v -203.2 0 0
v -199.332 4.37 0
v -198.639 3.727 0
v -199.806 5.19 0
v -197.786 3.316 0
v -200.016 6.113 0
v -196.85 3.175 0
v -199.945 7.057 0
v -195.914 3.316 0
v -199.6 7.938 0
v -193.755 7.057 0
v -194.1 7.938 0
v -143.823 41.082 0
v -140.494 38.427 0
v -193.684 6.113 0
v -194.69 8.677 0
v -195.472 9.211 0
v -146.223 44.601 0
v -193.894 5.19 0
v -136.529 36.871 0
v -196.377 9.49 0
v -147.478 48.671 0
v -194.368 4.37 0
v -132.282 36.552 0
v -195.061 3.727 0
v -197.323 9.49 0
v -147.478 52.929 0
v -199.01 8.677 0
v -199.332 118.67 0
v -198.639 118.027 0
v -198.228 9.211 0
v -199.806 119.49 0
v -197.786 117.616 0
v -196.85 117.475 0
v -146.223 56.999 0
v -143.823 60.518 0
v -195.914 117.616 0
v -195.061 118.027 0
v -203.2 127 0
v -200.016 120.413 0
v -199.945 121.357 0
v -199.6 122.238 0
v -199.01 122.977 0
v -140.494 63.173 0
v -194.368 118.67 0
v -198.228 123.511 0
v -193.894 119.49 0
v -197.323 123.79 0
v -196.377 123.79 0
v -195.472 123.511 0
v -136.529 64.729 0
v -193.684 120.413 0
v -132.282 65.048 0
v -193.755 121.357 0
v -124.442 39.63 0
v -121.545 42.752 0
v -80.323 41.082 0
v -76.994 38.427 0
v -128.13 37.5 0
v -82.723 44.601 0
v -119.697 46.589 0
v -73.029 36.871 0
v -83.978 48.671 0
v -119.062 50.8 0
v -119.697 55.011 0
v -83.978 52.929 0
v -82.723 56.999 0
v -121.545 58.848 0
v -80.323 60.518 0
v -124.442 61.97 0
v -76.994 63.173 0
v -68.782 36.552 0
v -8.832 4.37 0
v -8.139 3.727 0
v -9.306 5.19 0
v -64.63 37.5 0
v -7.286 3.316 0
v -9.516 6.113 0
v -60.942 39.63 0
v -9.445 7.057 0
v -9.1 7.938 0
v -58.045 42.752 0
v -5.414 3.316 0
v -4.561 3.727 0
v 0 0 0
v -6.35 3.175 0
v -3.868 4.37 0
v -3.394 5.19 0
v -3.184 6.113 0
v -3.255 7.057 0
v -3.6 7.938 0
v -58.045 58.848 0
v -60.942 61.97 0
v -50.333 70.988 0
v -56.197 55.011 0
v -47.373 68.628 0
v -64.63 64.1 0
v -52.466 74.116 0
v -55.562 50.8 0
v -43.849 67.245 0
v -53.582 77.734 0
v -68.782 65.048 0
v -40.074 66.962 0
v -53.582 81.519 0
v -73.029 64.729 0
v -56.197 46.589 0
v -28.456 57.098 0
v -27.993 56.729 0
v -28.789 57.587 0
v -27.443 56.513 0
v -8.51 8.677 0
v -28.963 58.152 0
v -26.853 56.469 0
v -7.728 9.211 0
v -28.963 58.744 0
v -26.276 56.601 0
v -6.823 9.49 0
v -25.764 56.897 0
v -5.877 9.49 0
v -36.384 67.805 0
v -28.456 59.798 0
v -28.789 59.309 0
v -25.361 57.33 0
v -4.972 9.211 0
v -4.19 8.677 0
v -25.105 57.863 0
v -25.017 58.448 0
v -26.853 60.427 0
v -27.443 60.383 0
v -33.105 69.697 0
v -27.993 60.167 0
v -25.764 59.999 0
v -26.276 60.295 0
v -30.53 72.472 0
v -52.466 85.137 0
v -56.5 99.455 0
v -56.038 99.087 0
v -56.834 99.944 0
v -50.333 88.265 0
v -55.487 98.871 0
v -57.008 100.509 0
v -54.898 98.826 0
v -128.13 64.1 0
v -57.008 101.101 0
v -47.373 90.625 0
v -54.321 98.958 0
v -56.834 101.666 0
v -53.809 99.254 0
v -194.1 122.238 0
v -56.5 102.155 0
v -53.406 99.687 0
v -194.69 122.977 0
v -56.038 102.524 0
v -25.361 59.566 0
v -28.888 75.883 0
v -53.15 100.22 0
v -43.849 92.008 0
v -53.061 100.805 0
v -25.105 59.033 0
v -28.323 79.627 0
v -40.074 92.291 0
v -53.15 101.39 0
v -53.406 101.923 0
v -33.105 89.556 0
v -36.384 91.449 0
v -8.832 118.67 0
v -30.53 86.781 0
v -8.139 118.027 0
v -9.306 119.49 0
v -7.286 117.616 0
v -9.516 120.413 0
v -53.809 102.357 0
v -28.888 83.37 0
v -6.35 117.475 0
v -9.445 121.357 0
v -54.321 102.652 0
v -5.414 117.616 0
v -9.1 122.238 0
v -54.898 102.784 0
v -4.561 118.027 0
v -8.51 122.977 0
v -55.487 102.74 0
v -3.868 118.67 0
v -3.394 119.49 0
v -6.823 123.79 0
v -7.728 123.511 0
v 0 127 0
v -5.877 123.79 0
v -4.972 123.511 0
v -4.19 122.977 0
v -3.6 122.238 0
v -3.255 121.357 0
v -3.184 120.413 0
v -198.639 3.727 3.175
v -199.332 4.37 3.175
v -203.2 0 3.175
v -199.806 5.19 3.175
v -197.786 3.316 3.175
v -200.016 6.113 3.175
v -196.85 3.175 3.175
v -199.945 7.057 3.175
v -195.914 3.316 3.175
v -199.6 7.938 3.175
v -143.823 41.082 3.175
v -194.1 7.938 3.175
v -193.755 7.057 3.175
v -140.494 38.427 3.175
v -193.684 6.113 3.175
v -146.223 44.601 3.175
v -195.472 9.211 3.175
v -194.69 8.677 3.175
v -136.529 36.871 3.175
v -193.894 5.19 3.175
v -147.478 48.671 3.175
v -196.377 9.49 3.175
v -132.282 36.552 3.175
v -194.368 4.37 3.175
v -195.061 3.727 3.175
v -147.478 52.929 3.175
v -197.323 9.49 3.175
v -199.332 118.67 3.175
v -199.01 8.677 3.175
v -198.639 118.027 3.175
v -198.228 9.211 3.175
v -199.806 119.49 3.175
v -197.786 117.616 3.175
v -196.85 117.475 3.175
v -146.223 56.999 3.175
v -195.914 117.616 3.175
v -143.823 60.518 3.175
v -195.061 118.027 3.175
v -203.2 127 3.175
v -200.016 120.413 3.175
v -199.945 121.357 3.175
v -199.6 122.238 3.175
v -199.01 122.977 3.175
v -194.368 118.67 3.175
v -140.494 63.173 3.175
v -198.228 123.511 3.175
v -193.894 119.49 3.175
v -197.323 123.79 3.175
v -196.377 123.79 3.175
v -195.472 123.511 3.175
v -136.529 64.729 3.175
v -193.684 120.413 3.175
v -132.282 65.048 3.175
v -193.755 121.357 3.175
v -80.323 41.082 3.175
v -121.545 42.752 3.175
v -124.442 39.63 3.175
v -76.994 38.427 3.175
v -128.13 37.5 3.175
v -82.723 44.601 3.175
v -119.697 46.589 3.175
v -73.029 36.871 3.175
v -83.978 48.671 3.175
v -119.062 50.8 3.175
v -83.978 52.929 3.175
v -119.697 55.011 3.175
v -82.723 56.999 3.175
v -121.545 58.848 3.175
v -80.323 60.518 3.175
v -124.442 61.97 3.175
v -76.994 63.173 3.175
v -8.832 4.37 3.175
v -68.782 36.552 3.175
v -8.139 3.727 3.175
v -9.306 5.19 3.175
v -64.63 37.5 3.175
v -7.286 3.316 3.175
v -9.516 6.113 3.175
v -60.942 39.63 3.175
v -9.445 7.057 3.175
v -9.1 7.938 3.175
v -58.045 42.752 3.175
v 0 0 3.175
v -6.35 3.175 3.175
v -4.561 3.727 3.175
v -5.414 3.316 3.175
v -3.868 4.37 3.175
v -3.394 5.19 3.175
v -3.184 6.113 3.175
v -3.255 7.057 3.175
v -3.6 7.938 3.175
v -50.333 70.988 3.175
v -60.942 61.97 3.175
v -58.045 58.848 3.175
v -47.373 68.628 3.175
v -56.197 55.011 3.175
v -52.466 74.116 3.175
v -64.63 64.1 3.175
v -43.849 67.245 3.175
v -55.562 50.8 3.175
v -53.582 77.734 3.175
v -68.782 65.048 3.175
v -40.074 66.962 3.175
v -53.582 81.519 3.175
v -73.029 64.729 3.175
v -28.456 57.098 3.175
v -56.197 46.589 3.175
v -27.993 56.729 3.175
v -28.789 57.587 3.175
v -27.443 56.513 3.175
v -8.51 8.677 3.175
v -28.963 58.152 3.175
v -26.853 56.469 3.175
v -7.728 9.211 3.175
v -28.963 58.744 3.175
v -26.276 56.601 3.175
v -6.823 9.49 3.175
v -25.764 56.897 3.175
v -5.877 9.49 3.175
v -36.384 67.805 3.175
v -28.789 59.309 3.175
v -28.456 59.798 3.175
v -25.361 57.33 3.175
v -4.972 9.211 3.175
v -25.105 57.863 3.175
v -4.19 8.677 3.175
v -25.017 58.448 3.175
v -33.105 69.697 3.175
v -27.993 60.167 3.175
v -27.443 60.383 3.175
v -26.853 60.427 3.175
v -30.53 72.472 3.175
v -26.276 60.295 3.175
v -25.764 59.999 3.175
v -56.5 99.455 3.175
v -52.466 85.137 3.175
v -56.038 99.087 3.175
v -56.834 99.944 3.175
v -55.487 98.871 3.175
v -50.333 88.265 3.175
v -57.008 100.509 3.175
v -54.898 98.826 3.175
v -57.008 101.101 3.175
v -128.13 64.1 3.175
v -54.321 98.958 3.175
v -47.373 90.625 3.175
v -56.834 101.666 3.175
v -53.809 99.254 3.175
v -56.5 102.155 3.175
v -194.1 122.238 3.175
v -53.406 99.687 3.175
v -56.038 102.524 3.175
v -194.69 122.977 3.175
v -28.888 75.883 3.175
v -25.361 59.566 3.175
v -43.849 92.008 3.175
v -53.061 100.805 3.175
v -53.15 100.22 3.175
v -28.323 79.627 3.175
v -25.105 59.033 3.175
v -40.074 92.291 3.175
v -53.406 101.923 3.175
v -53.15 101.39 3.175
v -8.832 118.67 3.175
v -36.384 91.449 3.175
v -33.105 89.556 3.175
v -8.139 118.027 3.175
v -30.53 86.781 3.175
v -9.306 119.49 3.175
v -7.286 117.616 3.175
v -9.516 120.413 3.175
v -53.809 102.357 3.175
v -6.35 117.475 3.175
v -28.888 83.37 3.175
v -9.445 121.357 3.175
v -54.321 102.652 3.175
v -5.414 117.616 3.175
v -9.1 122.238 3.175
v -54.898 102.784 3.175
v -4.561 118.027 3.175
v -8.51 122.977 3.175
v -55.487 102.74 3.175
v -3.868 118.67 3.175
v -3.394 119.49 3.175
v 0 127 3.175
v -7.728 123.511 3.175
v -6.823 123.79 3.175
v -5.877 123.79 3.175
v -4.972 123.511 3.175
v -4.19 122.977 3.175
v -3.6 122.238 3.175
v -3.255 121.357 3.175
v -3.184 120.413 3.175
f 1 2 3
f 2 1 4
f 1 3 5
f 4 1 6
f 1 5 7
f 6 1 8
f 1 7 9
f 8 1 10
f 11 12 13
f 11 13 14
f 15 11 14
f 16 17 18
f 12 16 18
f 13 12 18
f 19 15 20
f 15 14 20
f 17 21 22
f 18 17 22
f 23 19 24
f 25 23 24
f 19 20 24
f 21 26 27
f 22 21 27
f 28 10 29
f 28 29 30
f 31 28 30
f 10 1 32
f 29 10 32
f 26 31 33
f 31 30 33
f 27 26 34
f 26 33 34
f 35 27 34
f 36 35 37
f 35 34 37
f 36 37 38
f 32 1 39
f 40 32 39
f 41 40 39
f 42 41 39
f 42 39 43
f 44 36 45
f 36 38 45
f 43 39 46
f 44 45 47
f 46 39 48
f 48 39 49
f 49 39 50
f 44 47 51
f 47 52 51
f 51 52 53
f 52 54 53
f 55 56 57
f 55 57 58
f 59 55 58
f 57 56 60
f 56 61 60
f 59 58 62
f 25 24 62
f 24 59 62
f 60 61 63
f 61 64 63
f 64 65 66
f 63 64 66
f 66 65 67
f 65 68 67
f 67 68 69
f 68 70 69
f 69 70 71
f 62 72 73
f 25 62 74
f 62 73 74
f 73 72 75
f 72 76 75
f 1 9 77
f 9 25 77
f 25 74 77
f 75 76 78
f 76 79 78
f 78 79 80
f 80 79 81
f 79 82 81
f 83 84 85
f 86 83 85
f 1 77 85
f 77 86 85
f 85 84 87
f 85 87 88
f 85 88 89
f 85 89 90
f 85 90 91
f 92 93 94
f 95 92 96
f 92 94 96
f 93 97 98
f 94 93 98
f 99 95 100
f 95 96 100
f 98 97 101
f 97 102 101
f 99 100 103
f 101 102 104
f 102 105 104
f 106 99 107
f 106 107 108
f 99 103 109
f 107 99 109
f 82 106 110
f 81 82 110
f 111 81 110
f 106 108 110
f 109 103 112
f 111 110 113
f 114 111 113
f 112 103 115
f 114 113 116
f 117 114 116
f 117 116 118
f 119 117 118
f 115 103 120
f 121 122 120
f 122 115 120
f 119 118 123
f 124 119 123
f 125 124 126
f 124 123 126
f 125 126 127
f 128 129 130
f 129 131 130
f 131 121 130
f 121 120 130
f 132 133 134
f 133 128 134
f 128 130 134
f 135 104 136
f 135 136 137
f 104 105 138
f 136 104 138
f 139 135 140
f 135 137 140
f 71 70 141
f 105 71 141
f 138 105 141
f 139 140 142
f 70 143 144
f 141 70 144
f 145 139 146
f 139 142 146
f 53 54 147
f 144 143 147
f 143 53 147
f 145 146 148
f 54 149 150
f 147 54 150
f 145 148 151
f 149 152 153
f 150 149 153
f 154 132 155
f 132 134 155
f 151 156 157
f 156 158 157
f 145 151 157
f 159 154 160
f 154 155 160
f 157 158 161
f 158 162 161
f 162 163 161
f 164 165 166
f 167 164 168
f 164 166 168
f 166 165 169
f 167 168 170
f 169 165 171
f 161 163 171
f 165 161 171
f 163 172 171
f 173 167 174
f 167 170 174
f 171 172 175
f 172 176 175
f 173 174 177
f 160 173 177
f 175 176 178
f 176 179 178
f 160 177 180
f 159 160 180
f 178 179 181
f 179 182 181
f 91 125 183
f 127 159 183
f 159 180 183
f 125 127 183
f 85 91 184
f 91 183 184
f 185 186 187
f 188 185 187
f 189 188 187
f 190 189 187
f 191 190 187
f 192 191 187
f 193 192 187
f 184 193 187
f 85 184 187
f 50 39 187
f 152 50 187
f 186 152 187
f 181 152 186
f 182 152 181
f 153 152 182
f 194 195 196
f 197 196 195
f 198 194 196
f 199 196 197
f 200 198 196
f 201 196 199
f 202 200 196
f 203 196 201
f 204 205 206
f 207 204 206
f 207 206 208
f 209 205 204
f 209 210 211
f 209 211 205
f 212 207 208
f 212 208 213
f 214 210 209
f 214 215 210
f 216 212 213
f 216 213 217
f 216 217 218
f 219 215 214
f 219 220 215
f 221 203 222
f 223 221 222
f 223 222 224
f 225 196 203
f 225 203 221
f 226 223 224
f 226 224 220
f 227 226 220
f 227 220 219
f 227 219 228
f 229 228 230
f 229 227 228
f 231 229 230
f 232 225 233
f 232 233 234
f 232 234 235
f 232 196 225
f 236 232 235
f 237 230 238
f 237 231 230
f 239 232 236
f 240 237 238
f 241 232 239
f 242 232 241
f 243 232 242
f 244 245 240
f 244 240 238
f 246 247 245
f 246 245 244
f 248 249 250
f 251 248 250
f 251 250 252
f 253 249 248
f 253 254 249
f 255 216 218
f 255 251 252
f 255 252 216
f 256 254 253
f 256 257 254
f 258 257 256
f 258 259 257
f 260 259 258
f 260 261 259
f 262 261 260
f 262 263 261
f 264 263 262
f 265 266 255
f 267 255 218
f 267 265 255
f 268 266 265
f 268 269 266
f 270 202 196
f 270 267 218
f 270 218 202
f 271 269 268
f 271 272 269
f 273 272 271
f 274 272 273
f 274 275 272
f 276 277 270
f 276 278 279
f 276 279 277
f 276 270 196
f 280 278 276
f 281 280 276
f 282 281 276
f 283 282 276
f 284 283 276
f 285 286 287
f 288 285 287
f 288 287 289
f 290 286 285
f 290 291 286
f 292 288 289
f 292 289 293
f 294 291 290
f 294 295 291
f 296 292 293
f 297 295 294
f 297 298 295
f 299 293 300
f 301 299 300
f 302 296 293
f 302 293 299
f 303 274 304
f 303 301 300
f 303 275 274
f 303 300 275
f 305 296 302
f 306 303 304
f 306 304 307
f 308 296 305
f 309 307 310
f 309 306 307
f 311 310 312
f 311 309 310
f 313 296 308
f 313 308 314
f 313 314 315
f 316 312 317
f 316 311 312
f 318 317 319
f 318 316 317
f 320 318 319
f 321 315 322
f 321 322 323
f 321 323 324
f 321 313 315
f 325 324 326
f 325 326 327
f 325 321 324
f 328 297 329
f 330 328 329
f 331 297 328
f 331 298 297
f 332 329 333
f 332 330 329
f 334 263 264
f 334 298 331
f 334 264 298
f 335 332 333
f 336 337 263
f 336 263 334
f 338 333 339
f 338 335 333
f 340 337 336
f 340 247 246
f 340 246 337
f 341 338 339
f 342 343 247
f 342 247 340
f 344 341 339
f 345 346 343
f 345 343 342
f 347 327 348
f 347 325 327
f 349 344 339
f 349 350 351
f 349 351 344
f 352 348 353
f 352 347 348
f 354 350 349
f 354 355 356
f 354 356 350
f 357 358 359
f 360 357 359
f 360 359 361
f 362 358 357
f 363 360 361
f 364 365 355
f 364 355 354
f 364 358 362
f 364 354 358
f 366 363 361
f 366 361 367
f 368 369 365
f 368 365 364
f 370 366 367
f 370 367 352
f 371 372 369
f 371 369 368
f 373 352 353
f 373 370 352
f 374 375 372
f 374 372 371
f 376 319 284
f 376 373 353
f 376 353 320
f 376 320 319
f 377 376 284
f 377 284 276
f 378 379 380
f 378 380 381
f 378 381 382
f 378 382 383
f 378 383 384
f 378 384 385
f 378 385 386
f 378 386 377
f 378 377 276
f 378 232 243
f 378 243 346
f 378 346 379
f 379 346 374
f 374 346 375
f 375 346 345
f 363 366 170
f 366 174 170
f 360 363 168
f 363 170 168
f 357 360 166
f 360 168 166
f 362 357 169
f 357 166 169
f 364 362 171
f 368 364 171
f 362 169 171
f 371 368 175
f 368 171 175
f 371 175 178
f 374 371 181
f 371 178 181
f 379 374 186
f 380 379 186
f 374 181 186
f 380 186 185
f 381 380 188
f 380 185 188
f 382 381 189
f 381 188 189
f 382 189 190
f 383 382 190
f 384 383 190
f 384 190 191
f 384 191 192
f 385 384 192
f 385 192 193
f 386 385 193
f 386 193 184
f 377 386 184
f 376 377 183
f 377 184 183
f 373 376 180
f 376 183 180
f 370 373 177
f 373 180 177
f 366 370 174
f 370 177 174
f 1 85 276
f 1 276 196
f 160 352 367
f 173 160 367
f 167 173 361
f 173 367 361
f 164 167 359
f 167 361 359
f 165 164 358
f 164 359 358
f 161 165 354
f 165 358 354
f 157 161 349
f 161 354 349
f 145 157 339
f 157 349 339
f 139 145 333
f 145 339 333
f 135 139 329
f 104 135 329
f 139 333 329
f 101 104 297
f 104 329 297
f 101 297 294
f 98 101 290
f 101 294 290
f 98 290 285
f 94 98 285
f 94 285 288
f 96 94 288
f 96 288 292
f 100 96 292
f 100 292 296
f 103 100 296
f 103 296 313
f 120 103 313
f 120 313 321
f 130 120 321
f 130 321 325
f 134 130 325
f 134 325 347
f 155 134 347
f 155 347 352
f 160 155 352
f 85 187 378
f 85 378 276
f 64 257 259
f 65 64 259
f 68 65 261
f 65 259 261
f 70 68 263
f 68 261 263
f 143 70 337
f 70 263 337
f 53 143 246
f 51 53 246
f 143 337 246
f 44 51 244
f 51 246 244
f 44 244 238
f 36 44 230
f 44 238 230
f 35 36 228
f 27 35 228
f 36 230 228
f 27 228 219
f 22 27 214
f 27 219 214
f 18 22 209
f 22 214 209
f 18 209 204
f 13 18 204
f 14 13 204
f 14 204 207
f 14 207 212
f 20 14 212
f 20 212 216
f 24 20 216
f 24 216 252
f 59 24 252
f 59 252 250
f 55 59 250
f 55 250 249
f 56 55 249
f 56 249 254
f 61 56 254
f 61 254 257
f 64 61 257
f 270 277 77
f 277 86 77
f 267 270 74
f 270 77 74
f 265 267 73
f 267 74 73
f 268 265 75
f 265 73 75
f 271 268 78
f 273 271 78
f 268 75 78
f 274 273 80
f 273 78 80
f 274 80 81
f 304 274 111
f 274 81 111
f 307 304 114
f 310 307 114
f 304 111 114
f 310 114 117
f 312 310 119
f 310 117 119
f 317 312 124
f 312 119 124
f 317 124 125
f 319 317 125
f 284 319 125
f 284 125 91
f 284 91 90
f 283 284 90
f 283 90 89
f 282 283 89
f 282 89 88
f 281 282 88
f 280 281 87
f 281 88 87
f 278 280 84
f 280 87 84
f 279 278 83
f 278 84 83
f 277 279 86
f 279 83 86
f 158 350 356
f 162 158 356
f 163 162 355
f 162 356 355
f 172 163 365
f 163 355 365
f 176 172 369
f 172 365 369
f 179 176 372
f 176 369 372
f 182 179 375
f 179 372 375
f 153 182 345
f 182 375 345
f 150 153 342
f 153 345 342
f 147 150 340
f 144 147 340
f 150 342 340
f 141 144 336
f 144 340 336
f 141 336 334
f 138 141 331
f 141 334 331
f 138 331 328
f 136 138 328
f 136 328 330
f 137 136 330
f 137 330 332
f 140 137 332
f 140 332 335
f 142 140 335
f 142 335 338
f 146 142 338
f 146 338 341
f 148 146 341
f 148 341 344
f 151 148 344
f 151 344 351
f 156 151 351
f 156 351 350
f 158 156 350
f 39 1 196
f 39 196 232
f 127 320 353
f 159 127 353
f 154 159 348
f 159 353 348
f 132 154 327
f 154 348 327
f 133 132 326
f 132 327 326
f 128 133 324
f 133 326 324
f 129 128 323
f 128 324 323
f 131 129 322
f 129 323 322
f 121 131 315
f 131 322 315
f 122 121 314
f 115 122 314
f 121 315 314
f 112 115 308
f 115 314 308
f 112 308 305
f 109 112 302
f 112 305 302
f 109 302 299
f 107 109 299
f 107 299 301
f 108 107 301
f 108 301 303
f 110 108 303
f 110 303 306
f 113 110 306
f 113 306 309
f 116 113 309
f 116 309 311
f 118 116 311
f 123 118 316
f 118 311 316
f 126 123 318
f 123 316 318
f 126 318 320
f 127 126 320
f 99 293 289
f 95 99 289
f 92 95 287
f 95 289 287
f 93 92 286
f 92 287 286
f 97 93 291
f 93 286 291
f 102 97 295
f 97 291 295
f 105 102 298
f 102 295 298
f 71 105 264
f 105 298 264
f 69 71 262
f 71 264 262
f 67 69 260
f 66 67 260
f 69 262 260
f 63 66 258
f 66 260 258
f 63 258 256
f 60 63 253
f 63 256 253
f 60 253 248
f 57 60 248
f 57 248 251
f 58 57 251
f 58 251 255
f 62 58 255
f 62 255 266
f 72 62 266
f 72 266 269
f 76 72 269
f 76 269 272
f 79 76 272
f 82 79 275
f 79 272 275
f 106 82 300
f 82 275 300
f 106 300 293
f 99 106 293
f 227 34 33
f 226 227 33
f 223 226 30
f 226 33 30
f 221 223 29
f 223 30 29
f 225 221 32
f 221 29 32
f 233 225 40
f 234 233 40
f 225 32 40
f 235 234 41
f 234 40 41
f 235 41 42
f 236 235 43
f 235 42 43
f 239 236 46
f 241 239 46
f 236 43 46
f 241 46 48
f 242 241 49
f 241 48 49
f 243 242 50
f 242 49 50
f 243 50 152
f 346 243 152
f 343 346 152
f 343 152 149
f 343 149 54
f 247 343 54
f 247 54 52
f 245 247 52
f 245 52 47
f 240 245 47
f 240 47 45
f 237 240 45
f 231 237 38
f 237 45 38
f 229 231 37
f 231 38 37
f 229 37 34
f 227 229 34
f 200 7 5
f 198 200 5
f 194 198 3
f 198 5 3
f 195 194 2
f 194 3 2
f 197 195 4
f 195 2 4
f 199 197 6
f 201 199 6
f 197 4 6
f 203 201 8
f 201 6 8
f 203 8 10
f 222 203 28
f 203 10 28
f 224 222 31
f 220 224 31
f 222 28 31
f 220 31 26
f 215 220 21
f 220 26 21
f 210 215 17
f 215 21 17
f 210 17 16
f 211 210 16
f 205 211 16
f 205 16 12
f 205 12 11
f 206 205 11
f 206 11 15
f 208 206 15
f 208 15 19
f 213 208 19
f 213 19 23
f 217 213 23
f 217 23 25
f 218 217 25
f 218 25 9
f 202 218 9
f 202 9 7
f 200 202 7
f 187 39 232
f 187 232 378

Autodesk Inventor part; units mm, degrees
ref_plane "YZ Plane" through (0, 0, 0) normal (1, 0, 0) x (0, 1, 0)
ref_plane "XZ Plane" through (0, 0, 0) normal (0, 1, 0) x (-1, 0, 0)
sketch "Sketch1" plane through (0, 0, 0) normal (0, 0, 1) x (1, 0, 0)
  line L0 (0, 0) -> (-203.2, 0)
  line L1 (-203.2, 0) -> (-203.2, 127)
  line L2 (-203.2, 127) -> (0, 127)
  line L3 (0, 127) -> (0, 0)
  dimension "d0" = 127
  dimension "d1" = 203.2
extrude "Extrusion1" add sketch "Sketch1" along normal blind 3.175
sketch "Sketch2" plane through (0, 0, 3.175) normal (0, 0, 1) x (1, 0, 0)
  circle A0 centre (-69.85, 50.8) radius 14.2875
  line L0 (0, 0) -> (0, 127) projected
  line L1 (-203.2, 0) -> (0, 0) projected
  circle A1 centre (-133.35, 50.8) radius 14.2875
  line L2 (-101.6, 0) -> (-101.6, 50.8)
  line L3 (-101.6, 50.8) -> (-69.85, 50.8)
  line L4 (-69.85, 50.8) -> (-133.35, 50.8)
  dimension "d4" = 28.575
  dimension "d8" = 28.575
  dimension "d9" = 50.8
  dimension "d28" = 63.5
  dimension "d29" = 31.75
extrude "Extrusion2" cut sketch "Sketch2" against normal blind 3.175
sketch "Sketch3" plane through (0, 0, 3.175) normal (0, 0, 1) x (1, 0, 0)
  circle A0 centre (-6.35, 6.35) radius 3.175
  line L0 (0, 0) -> (0, 127) projected
  line L1 (-203.2, 0) -> (0, 0) projected
  circle A1 centre (-6.35, 120.65) radius 3.175
  line L2 (0, 127) -> (-203.2, 127) projected
  circle A2 centre (-196.85, 120.65) radius 3.175
  circle A3 centre (-196.85, 6.35) radius 3.175
  line L3 (-203.2, 127) -> (-203.2, 0) projected
  dimension "d12" = 6.35
  dimension "d13" = 6.35
  dimension "d14" = 6.35
  dimension "d15" = 6.35
  dimension "d16" = 6.35
  dimension "d17" = 6.35
  dimension "d18" = 6.35
  dimension "d19" = 6.35
  dimension "d20" = 6.35
  dimension "d30" = 6.35
  dimension "d31" = 6.35
  dimension "d32" = 6.35
hole "Hole1" at (-196.85, 120.65, 3.175) at (-196.85, 6.35, 3.175) at (-6.35, 6.35, 3.175) at (-6.35, 120.65, 3.175) direction (0, 0, -1) diameter 6.35 end through all
ref_plane "Work Plane1" through (-101.6, 0, 0) normal (1, 0, 0) x (0, 0, -1)
sketch "Sketch4" plane through (0, 0, 3.175) normal (0, 0, 1) x (1, 0, 0)
  circle A0 centre (-69.85, 50.8) radius 14.2875 projected
  line L0 (-69.85, 50.8) -> (-41.0234, 79.6266)
  line L1 (-69.85, 50.8) -> (-23.1148, 50.8)
  circle A1 centre (-41.0234, 79.6266) radius 12.7
  point P0 (0, 0)
  dimension "d33" = 40.767
  dimension "d34" = 315
  dimension "d35" = 25.4
extrude "Extrusion3" cut sketch "Sketch4" against normal through all contours A1
sketch "Sketch5" plane through (0, 0, 3.175) normal (0, 0, 1) x (1, 0, 0)
  circle A0 centre (-41.0234, 79.6266) radius 12.7 projected
  line L0 (-41.0234, 79.6266) -> (-27.001, 58.448)
  line L1 (-41.0234, 79.6266) -> (-19.8448, 93.649)
  line L2 (-41.0234, 79.6266) -> (-55.0458, 100.8052)
  circle A1 centre (-55.0458, 100.8052) radius 1.9844
  circle A2 centre (-19.8448, 93.649) radius 1.9844
  circle A3 centre (-27.001, 58.448) radius 1.9844
  point P0 (0, 0)
  dimension "d38" = 25.4
  dimension "d39" = 25.4
  dimension "d40" = 25.4
  dimension "d41" = 3.9688
  dimension "d42" = 3.9688
  dimension "d43" = 3.9688
extrude "Extrusion4" cut sketch "Sketch5" against normal blind 25.4 contours A3 | A1
equation "\"d29\" = 0.5 * d28"
properties part number "Gearbox plate"
